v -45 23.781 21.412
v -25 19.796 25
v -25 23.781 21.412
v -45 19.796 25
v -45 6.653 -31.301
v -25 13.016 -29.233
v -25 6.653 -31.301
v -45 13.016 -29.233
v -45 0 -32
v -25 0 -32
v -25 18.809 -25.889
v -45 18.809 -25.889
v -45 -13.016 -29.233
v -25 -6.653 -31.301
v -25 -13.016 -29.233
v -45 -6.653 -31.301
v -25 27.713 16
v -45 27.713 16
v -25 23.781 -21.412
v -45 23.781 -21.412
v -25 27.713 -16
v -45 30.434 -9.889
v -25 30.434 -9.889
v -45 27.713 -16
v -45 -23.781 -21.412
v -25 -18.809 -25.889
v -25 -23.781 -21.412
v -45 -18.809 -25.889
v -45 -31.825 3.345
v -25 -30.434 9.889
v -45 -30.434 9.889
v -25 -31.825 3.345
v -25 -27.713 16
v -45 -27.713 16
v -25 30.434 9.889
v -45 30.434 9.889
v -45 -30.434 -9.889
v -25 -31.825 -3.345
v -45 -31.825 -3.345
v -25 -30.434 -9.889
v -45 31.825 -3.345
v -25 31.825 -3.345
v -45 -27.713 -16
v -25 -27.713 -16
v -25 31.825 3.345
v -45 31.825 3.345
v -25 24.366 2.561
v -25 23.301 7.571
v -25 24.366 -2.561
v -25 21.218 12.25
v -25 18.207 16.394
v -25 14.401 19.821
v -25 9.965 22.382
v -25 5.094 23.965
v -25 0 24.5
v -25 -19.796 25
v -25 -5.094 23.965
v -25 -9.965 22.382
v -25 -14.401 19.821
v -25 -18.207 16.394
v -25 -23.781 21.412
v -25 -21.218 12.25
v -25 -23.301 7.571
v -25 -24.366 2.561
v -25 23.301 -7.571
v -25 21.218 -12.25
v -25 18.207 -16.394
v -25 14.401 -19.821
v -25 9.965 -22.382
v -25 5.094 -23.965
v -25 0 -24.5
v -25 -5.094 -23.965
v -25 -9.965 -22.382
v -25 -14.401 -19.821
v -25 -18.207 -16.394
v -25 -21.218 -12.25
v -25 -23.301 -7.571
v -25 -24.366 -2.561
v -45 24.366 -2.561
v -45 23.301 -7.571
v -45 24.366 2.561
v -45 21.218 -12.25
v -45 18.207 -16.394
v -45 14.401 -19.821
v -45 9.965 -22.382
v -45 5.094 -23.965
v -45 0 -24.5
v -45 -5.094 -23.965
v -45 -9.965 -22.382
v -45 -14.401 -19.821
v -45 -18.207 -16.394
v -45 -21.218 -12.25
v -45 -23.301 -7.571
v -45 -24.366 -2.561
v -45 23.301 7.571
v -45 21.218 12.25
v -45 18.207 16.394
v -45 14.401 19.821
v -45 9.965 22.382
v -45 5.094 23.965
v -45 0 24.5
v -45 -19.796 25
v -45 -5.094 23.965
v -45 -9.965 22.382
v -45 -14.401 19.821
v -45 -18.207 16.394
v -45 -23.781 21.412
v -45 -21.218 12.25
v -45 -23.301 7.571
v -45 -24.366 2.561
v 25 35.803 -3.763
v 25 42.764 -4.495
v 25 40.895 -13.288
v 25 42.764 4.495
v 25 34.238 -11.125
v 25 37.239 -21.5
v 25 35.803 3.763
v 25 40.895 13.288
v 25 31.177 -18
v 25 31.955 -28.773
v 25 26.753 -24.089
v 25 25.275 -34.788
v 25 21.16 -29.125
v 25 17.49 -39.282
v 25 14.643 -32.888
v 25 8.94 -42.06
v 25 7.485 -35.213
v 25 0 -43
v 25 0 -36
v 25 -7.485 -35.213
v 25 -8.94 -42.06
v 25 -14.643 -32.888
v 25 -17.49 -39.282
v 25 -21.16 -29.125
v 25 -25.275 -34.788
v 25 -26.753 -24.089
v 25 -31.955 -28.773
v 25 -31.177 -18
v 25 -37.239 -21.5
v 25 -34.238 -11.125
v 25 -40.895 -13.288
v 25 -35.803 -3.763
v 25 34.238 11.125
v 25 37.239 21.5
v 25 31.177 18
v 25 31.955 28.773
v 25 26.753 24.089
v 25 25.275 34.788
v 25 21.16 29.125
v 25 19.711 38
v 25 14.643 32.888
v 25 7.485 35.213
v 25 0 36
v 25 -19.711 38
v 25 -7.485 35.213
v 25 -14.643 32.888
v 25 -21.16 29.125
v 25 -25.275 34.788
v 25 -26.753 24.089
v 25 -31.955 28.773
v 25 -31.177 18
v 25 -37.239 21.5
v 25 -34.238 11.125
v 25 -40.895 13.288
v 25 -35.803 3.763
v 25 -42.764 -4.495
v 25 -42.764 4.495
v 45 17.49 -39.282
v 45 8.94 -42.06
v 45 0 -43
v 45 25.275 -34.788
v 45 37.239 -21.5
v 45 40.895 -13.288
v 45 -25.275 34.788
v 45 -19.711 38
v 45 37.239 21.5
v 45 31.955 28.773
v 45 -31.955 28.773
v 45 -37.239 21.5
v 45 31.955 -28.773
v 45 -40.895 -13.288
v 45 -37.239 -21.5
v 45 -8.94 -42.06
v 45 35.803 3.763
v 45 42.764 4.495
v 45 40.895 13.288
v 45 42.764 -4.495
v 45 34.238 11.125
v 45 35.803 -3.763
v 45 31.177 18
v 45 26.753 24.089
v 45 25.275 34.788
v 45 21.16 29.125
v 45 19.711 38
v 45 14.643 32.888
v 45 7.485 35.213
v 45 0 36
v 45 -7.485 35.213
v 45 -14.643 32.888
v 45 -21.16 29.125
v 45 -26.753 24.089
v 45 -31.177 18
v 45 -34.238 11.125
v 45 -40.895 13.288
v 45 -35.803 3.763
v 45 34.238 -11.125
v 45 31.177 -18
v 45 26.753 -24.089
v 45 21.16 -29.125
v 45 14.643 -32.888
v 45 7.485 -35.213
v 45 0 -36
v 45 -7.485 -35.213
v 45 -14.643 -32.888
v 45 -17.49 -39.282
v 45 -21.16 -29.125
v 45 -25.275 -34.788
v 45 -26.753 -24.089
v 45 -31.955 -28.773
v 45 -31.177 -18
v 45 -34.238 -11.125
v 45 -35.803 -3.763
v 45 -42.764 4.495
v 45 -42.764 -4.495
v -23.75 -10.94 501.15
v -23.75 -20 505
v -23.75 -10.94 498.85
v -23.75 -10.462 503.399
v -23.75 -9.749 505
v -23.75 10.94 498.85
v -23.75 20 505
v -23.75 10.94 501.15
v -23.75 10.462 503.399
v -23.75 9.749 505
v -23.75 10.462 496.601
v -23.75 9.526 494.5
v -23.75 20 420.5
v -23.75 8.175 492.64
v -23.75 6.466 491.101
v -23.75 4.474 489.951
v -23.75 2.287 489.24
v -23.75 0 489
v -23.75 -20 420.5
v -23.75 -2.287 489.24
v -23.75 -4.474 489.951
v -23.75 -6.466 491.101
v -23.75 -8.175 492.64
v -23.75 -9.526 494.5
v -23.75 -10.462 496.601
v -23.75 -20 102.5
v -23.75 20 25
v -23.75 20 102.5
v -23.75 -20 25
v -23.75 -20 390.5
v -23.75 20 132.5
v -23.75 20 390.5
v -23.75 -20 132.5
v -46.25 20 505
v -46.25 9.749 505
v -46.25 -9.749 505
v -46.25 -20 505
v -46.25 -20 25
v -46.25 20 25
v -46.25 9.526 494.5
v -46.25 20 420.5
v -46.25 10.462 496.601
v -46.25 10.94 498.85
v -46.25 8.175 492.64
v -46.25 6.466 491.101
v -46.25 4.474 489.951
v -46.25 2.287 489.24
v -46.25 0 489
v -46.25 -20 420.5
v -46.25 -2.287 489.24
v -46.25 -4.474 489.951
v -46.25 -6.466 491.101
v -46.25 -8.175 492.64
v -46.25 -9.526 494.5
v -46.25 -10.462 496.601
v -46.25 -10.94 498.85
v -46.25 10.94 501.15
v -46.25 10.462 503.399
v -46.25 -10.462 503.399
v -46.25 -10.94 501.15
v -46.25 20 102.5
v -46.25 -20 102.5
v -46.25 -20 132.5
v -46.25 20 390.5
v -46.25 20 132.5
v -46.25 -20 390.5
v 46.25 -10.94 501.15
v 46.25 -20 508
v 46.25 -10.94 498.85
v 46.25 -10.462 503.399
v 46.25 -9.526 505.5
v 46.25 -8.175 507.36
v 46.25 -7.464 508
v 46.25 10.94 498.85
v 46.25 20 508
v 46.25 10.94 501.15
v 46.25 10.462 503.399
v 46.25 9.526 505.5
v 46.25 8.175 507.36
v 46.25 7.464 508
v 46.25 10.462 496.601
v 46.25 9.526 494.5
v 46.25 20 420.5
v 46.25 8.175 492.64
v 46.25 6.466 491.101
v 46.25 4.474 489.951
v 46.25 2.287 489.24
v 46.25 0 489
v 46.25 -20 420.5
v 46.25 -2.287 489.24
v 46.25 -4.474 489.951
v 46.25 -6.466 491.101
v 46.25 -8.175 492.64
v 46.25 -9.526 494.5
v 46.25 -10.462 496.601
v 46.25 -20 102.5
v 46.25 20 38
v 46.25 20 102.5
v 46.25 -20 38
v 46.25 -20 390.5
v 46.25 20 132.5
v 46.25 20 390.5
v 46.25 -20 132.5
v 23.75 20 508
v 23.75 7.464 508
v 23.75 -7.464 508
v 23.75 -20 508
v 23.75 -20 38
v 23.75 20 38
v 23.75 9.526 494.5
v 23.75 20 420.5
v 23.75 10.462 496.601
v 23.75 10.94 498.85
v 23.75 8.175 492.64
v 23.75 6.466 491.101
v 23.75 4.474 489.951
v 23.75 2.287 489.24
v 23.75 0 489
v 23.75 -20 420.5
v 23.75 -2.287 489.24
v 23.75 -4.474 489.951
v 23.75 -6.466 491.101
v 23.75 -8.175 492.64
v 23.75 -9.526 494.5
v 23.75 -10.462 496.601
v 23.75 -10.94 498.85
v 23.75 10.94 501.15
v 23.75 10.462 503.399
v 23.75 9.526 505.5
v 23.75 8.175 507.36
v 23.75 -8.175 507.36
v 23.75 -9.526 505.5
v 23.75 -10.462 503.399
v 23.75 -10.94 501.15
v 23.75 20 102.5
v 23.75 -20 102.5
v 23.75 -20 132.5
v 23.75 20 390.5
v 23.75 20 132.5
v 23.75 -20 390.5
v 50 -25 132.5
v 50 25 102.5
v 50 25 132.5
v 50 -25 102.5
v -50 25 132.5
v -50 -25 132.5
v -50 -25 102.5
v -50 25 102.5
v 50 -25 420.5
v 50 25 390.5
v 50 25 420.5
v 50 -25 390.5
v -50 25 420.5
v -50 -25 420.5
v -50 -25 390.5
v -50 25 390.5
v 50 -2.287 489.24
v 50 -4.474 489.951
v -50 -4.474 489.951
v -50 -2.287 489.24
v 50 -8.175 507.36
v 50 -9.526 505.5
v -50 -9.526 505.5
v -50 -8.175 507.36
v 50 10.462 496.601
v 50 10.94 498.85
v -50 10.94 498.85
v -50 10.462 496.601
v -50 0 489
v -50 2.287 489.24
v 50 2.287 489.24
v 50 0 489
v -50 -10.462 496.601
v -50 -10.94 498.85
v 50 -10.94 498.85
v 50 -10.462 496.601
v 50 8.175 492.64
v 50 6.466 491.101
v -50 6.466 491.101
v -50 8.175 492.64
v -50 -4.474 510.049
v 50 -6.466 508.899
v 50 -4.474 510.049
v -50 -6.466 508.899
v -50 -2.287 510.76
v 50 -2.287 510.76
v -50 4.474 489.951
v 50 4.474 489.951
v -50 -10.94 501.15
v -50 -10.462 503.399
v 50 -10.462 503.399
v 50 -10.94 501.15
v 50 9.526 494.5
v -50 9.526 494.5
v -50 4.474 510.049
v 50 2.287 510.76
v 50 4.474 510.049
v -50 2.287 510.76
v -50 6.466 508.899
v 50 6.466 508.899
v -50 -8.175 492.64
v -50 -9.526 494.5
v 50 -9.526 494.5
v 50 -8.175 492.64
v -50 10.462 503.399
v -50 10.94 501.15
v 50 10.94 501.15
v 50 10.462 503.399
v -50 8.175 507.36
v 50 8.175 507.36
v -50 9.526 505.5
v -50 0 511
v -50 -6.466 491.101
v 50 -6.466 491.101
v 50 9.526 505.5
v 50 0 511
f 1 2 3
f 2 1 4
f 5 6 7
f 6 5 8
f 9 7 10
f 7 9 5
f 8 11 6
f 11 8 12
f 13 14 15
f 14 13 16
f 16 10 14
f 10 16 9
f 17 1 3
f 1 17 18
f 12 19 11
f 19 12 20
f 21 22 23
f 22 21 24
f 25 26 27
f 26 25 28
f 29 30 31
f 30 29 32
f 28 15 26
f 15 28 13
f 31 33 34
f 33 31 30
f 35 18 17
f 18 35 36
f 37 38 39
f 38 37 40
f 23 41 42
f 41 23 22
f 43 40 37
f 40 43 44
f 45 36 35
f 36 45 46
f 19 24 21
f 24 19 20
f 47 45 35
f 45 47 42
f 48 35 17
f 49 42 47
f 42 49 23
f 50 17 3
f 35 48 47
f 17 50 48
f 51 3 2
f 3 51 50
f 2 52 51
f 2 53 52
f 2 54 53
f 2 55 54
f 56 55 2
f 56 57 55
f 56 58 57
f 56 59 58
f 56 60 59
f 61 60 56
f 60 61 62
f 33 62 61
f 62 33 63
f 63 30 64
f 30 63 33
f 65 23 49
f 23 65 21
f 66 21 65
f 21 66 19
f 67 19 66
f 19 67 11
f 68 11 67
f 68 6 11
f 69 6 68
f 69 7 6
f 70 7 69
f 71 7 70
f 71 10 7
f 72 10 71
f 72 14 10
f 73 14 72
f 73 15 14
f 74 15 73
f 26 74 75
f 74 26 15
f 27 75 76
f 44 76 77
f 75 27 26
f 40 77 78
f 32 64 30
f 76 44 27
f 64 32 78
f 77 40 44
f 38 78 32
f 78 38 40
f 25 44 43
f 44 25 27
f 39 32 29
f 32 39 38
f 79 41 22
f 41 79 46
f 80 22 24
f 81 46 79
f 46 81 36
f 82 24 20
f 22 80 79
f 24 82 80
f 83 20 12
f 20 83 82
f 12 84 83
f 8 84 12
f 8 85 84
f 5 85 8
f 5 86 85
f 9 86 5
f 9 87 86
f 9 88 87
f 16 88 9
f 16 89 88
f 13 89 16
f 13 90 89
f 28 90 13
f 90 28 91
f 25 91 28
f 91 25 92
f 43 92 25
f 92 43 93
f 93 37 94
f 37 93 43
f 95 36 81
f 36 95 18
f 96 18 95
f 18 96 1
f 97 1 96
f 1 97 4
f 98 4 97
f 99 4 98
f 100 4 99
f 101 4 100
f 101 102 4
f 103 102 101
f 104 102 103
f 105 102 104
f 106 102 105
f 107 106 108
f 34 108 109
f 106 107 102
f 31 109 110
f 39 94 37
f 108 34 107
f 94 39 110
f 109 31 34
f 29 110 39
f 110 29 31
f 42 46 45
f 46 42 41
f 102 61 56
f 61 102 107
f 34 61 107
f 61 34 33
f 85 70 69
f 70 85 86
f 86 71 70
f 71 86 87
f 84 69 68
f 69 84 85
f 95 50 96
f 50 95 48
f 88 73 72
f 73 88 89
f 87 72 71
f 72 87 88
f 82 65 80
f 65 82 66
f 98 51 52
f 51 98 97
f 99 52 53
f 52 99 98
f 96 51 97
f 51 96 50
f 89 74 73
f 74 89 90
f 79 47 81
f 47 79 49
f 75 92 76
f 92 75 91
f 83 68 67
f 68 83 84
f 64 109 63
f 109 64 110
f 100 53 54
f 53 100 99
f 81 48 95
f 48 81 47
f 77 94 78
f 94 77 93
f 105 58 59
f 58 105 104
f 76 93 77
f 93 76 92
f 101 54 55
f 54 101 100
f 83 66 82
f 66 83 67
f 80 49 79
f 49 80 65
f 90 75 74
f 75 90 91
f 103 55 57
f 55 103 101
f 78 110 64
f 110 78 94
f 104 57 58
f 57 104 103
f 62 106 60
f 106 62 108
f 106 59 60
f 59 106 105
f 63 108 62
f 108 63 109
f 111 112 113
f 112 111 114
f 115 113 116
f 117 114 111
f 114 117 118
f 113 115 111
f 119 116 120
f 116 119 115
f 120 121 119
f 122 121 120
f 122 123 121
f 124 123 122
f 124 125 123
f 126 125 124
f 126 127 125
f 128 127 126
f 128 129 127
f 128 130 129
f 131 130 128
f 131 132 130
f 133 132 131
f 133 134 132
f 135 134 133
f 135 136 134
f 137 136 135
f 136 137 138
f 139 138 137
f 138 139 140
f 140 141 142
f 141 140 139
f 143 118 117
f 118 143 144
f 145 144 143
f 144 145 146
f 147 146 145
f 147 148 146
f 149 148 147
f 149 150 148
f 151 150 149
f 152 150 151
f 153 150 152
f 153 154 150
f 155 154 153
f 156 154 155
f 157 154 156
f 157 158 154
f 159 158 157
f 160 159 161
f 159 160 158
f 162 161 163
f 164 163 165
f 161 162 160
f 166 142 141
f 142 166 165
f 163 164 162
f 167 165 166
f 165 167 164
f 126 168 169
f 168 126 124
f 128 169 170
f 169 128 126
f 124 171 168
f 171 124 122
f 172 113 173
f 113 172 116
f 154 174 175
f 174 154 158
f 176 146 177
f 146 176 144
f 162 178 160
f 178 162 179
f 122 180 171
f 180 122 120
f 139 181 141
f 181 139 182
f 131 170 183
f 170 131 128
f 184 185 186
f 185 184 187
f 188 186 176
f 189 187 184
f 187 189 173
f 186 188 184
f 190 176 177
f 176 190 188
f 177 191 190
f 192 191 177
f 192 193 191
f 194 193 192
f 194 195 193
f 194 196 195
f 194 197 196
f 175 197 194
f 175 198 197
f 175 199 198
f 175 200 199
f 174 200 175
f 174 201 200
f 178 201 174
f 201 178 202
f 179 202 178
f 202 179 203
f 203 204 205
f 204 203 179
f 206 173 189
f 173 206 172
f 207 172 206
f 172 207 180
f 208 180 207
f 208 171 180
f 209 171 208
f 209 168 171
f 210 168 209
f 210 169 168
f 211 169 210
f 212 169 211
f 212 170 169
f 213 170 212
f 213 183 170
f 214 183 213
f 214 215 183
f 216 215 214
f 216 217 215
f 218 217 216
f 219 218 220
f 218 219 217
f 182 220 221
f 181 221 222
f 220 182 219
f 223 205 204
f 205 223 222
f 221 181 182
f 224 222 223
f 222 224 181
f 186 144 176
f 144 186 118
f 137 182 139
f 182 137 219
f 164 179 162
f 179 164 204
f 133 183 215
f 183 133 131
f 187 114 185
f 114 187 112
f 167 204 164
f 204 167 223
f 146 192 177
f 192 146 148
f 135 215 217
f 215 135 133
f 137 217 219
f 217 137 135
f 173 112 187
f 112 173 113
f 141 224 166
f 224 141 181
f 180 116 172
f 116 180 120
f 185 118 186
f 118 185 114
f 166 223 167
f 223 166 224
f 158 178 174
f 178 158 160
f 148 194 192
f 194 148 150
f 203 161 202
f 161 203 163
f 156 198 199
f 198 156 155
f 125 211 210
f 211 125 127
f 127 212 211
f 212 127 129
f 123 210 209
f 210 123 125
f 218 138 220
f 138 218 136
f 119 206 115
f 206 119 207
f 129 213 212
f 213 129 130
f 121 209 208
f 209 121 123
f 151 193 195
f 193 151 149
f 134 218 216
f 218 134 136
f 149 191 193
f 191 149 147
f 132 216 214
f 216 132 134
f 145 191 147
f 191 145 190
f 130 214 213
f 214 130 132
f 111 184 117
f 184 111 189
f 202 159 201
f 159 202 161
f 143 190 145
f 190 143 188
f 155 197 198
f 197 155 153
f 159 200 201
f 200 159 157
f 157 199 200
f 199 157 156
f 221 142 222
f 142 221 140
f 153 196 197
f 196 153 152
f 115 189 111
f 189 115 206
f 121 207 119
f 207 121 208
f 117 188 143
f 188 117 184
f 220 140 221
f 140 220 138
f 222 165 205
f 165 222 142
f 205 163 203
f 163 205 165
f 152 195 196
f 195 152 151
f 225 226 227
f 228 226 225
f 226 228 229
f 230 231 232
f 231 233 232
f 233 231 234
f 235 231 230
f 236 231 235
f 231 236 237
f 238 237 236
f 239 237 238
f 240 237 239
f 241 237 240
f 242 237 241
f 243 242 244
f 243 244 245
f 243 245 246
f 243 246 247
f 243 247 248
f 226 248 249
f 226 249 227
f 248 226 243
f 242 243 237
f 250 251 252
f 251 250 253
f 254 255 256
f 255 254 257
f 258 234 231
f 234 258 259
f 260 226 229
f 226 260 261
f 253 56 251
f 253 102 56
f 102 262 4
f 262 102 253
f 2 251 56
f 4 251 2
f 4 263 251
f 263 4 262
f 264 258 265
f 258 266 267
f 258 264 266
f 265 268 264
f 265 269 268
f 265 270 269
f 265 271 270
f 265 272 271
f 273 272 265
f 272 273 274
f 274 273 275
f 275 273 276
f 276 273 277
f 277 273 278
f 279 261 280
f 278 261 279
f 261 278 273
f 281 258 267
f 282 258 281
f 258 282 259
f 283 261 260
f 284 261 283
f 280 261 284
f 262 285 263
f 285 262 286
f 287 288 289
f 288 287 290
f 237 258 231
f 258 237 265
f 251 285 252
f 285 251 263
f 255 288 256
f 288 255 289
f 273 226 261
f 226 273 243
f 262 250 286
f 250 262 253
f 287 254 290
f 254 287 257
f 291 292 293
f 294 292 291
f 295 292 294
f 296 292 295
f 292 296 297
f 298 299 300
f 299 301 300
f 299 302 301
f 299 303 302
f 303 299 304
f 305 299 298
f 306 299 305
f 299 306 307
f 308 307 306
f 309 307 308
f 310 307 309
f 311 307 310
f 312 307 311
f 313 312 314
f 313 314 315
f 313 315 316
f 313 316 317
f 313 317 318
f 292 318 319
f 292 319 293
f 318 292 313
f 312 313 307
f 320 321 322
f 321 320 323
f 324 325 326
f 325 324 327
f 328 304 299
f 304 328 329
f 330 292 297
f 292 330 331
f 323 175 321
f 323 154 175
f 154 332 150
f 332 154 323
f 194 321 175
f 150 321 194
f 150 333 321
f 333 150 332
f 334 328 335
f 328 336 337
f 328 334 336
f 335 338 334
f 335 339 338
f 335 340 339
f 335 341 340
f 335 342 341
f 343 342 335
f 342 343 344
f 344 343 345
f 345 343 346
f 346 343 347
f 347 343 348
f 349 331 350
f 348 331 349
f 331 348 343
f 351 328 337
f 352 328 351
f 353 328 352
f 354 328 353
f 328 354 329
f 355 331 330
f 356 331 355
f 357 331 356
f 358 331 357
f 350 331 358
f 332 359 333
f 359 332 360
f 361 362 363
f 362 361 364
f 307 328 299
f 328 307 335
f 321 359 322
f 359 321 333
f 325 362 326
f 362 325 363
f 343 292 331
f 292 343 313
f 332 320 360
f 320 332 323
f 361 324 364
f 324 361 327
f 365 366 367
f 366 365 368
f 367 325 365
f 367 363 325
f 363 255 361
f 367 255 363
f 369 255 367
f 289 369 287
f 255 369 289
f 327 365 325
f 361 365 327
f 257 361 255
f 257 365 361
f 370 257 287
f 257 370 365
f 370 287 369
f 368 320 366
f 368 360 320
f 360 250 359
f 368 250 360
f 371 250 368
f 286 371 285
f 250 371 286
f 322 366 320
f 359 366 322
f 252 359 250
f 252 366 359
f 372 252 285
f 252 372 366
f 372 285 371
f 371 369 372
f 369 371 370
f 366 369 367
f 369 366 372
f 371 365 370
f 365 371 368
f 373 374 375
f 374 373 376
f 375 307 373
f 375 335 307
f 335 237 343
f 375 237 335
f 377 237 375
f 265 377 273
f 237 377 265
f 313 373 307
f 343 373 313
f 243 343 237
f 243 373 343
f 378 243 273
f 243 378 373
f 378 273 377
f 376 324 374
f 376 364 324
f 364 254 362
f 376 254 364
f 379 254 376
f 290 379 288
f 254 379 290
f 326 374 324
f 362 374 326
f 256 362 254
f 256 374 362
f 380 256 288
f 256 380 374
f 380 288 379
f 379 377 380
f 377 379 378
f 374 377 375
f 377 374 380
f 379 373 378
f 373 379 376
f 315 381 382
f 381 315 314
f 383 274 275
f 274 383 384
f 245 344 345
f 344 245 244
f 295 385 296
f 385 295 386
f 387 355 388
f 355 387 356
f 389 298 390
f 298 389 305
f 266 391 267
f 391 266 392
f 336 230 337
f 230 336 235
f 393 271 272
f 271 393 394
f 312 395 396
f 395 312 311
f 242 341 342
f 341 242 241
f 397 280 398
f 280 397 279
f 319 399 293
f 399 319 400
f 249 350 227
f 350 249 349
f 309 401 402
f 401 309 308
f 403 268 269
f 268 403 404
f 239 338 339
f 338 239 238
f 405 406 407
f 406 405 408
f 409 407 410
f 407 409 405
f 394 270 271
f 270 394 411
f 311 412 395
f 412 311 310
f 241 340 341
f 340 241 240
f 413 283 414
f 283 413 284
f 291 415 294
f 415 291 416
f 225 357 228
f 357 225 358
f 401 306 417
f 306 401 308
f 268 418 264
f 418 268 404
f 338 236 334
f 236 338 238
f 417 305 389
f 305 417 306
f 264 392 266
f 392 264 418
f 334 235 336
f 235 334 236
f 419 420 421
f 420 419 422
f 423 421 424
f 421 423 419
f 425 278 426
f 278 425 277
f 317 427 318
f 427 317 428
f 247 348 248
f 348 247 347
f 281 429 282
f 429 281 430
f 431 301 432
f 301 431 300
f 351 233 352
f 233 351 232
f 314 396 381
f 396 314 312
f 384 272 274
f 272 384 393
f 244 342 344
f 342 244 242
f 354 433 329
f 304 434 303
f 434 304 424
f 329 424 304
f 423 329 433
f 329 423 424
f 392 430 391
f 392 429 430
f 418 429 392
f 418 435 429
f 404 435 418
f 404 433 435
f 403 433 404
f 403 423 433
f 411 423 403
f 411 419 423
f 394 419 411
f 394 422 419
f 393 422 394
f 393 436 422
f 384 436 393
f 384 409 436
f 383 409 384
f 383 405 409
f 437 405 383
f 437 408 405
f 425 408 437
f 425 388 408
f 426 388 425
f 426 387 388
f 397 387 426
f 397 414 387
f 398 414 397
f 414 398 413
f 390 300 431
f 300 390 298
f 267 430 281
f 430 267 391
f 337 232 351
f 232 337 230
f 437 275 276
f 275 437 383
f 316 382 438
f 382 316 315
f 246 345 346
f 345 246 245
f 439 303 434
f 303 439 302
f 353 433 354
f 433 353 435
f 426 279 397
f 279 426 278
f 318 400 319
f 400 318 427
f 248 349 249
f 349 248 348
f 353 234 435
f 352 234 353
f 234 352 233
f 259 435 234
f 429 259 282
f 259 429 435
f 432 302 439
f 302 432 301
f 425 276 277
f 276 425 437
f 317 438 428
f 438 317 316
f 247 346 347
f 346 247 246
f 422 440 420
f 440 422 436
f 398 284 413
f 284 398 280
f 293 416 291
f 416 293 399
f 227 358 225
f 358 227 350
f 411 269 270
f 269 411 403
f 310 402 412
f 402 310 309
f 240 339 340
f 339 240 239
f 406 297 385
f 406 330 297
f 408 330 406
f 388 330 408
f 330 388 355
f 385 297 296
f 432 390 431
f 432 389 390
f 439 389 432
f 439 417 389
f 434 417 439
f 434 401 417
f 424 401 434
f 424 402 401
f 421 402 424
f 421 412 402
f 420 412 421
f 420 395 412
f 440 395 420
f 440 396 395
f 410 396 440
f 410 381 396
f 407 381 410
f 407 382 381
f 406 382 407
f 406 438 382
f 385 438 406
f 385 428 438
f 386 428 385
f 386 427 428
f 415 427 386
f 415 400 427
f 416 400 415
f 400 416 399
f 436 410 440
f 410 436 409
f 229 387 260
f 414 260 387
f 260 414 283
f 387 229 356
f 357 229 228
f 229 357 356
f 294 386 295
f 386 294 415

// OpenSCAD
// === STL Reference (visual only, not exported) ===
// %scale(1000) import("l1.stl");

// === Linkage Hoop Dimensions ===
hoop_left_outer_radius  = 32;
hoop_left_inner_radius  = 24.5;
hoop_right_outer_radius = 43;
hoop_right_inner_radius = 36;
hoop_thickness          = 20;

hoop_offset_x = 35;
hoop_center_z = 0;

// === Linkage Hoops ===
module linkage_hoop(x, outer_r, inner_r) {
    translate([x, 0, hoop_center_z])
        rotate([0, 90, 0])
            difference() {
                cylinder(r = outer_r, h = hoop_thickness, center = true);
                cylinder(r = inner_r, h = hoop_thickness + 2, center = true);  // slightly larger inner cut
            }
}

linkage_hoop(-hoop_offset_x, hoop_left_outer_radius,  hoop_left_inner_radius);
linkage_hoop( hoop_offset_x, hoop_right_outer_radius, hoop_right_inner_radius);

// === Linkage Bar Dimensions ===
bar_width   = 22.5;
bar_depth   = 40;
bar_height_left  = 480;
bar_height_right = 470;

bar_center_left_z  = 265;
bar_center_right_z = 273;

module linkage_bar(x, z, h) {
    translate([x, 0, z])
        cube([bar_width, bar_depth, h], center = true);
}

linkage_bar(-hoop_offset_x, bar_center_left_z,  bar_height_left);
linkage_bar( hoop_offset_x, bar_center_right_z, bar_height_right);

// === Support Struts ===
strut_width  = 100;
strut_depth  = 50;
strut_height = 30;

strut_lower_z = 117.5;
strut_upper_z = 405.5;

module support_strut(z) {
    translate([0, 0, z])
        cube([strut_width, strut_depth, strut_height], center = true);
}

support_strut(strut_lower_z);
support_strut(strut_upper_z);

// === Roller ===
roller_radius  = 11;
roller_length  = 100;
roller_center_z = 500;

translate([0, 0, roller_center_z])
    rotate([0, 90, 0])
        cylinder(r = roller_radius, h = roller_length, center = true);
